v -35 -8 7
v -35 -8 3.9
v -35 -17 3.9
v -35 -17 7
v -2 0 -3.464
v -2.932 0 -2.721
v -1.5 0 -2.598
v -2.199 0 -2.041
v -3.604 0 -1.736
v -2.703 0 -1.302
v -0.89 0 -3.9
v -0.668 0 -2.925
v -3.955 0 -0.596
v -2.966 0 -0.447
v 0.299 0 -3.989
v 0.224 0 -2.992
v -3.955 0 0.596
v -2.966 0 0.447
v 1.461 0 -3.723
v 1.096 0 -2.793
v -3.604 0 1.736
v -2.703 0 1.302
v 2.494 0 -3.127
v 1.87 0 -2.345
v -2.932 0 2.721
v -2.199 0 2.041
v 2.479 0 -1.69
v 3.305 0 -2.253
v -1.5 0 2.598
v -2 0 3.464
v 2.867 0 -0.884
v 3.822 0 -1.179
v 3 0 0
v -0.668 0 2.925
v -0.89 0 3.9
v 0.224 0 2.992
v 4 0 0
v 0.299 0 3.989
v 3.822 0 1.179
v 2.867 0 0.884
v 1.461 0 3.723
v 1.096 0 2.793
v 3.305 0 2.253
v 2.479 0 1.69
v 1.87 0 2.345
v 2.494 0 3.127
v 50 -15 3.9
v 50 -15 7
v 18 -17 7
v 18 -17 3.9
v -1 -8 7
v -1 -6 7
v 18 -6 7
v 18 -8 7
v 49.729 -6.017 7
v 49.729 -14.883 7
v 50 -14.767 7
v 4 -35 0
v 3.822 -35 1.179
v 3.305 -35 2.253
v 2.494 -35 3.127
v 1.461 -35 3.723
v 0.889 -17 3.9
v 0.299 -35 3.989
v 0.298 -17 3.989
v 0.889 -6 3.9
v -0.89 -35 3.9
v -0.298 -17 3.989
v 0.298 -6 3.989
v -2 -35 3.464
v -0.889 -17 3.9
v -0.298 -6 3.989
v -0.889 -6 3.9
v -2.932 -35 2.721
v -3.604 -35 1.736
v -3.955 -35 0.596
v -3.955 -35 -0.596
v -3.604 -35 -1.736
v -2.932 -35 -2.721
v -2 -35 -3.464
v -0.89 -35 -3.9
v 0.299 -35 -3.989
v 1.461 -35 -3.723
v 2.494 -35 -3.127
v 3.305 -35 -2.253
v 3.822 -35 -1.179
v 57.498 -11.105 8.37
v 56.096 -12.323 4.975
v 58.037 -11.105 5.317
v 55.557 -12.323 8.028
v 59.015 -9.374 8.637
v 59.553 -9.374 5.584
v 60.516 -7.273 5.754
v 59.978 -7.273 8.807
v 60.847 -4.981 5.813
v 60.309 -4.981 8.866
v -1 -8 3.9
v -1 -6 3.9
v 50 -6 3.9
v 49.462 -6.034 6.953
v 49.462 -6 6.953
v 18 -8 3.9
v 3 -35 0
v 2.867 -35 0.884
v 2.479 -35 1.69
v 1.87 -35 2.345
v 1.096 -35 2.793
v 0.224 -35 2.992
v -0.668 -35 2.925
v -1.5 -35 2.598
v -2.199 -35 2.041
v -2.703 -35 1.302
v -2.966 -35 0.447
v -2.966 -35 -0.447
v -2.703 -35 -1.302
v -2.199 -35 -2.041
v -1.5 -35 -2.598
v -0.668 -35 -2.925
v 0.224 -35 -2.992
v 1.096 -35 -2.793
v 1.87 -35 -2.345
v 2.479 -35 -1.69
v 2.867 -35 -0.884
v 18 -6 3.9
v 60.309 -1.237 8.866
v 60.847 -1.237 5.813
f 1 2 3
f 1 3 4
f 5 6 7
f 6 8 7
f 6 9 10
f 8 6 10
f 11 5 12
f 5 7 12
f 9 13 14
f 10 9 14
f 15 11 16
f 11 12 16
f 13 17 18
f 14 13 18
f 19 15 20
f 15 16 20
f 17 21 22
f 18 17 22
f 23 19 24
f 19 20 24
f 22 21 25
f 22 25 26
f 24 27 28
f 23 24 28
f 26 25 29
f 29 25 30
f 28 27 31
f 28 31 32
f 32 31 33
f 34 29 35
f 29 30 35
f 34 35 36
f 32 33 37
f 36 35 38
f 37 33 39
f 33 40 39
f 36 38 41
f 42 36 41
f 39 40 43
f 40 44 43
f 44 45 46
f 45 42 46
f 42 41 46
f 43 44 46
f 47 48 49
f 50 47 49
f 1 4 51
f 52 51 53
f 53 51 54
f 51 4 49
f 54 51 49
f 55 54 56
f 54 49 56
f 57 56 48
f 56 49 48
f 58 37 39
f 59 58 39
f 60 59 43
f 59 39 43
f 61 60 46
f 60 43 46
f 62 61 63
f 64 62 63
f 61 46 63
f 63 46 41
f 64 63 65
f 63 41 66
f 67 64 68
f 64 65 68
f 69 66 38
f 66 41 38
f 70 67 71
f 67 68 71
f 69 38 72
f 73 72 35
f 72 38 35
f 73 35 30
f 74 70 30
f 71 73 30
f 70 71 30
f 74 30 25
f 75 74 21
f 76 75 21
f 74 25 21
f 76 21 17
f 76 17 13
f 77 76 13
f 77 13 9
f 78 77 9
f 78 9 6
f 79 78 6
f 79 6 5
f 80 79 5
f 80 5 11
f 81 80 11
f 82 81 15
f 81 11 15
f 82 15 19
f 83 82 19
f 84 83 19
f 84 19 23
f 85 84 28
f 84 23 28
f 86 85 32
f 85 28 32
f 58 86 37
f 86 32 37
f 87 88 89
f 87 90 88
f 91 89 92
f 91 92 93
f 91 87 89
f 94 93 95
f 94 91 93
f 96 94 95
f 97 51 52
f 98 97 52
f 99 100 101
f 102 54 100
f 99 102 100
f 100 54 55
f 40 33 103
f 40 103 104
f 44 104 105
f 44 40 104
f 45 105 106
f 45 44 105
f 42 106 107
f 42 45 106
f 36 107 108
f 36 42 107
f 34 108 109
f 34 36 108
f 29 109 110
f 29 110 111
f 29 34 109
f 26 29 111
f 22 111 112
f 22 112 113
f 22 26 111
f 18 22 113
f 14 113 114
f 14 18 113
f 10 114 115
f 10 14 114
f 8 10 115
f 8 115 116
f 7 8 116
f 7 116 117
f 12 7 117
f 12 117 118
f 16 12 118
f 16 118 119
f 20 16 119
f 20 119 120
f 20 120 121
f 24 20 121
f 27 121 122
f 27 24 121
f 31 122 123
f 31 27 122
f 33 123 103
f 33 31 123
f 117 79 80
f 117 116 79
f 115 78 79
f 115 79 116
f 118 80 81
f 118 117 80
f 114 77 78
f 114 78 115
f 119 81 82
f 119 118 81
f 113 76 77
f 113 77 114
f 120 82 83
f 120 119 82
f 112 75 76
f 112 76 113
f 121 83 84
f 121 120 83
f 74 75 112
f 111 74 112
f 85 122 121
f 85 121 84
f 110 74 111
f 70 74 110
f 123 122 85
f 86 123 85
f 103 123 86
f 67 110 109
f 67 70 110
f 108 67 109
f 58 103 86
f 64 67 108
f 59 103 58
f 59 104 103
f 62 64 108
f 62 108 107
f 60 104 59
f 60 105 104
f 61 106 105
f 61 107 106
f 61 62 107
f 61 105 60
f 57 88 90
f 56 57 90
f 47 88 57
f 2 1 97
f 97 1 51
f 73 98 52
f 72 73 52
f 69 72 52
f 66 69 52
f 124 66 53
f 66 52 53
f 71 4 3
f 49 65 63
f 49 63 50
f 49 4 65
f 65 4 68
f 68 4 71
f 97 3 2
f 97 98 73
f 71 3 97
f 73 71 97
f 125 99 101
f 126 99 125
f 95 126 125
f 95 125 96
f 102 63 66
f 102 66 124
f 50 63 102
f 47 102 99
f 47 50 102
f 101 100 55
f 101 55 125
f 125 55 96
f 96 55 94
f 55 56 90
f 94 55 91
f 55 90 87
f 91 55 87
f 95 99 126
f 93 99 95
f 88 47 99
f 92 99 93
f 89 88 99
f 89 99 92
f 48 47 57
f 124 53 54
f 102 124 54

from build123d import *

# Parameters (mm, degrees)
F0_R     = 4
F0_R_2   = 3
F1_DEPTH = 35
F3_W     = 85
F3_H     = 3.1
F4_DEPTH = 11
F5_W     = 34
F5_H     = 2
F6_DEPTH = 3.1
F9_DEPTH = 3.1
F10_R    = 8


with BuildPart() as f1:
    # F0 (on Front) → F1 (new body)
    with BuildSketch(Plane.XZ):
        Circle(F0_R)
        Circle(F0_R_2, mode=Mode.SUBTRACT)
    extrude(amount=F1_DEPTH)

    # F3 (on offset) → F4 (join)
    with BuildSketch(Plane.XZ.offset(17)):
        with Locations((7.5, 5.45)):
            Rectangle(F3_W, F3_H)
    extrude(amount=-F4_DEPTH)

    # F5 (on face) → F6 (cut)
    with BuildSketch(Plane.XY.offset(7)):
        with Locations((-18, -7)):
            Rectangle(F5_W, F5_H)
        Polygon((50, -6), (18, -6), (18, -8), align=None)
        Polygon((50, -15), (18, -17), (50, -17), align=None)
    extrude(amount=-F6_DEPTH, mode=Mode.SUBTRACT)

    # F8 (on face) → F9 (join)
    with BuildSketch(Plane(origin=(0.840745, 0, -4.768103), x_dir=(0.984808, 0, 0.173648), z_dir=(0.173648, 0, -0.984808))):
        Polygon((60.9319, 10.237065), (49.917616, 15), (49.917616, 6), (60.9319, 1.237065), align=None)
    extrude(amount=-F9_DEPTH)

    # F10
    f10_edges = [f1.edges().sort_by_distance(p)[0] for p in [
        (60.577798, -10.237065, 7.339062),
    ]]
    fillet(f10_edges, radius=F10_R)


solid = f1.part
